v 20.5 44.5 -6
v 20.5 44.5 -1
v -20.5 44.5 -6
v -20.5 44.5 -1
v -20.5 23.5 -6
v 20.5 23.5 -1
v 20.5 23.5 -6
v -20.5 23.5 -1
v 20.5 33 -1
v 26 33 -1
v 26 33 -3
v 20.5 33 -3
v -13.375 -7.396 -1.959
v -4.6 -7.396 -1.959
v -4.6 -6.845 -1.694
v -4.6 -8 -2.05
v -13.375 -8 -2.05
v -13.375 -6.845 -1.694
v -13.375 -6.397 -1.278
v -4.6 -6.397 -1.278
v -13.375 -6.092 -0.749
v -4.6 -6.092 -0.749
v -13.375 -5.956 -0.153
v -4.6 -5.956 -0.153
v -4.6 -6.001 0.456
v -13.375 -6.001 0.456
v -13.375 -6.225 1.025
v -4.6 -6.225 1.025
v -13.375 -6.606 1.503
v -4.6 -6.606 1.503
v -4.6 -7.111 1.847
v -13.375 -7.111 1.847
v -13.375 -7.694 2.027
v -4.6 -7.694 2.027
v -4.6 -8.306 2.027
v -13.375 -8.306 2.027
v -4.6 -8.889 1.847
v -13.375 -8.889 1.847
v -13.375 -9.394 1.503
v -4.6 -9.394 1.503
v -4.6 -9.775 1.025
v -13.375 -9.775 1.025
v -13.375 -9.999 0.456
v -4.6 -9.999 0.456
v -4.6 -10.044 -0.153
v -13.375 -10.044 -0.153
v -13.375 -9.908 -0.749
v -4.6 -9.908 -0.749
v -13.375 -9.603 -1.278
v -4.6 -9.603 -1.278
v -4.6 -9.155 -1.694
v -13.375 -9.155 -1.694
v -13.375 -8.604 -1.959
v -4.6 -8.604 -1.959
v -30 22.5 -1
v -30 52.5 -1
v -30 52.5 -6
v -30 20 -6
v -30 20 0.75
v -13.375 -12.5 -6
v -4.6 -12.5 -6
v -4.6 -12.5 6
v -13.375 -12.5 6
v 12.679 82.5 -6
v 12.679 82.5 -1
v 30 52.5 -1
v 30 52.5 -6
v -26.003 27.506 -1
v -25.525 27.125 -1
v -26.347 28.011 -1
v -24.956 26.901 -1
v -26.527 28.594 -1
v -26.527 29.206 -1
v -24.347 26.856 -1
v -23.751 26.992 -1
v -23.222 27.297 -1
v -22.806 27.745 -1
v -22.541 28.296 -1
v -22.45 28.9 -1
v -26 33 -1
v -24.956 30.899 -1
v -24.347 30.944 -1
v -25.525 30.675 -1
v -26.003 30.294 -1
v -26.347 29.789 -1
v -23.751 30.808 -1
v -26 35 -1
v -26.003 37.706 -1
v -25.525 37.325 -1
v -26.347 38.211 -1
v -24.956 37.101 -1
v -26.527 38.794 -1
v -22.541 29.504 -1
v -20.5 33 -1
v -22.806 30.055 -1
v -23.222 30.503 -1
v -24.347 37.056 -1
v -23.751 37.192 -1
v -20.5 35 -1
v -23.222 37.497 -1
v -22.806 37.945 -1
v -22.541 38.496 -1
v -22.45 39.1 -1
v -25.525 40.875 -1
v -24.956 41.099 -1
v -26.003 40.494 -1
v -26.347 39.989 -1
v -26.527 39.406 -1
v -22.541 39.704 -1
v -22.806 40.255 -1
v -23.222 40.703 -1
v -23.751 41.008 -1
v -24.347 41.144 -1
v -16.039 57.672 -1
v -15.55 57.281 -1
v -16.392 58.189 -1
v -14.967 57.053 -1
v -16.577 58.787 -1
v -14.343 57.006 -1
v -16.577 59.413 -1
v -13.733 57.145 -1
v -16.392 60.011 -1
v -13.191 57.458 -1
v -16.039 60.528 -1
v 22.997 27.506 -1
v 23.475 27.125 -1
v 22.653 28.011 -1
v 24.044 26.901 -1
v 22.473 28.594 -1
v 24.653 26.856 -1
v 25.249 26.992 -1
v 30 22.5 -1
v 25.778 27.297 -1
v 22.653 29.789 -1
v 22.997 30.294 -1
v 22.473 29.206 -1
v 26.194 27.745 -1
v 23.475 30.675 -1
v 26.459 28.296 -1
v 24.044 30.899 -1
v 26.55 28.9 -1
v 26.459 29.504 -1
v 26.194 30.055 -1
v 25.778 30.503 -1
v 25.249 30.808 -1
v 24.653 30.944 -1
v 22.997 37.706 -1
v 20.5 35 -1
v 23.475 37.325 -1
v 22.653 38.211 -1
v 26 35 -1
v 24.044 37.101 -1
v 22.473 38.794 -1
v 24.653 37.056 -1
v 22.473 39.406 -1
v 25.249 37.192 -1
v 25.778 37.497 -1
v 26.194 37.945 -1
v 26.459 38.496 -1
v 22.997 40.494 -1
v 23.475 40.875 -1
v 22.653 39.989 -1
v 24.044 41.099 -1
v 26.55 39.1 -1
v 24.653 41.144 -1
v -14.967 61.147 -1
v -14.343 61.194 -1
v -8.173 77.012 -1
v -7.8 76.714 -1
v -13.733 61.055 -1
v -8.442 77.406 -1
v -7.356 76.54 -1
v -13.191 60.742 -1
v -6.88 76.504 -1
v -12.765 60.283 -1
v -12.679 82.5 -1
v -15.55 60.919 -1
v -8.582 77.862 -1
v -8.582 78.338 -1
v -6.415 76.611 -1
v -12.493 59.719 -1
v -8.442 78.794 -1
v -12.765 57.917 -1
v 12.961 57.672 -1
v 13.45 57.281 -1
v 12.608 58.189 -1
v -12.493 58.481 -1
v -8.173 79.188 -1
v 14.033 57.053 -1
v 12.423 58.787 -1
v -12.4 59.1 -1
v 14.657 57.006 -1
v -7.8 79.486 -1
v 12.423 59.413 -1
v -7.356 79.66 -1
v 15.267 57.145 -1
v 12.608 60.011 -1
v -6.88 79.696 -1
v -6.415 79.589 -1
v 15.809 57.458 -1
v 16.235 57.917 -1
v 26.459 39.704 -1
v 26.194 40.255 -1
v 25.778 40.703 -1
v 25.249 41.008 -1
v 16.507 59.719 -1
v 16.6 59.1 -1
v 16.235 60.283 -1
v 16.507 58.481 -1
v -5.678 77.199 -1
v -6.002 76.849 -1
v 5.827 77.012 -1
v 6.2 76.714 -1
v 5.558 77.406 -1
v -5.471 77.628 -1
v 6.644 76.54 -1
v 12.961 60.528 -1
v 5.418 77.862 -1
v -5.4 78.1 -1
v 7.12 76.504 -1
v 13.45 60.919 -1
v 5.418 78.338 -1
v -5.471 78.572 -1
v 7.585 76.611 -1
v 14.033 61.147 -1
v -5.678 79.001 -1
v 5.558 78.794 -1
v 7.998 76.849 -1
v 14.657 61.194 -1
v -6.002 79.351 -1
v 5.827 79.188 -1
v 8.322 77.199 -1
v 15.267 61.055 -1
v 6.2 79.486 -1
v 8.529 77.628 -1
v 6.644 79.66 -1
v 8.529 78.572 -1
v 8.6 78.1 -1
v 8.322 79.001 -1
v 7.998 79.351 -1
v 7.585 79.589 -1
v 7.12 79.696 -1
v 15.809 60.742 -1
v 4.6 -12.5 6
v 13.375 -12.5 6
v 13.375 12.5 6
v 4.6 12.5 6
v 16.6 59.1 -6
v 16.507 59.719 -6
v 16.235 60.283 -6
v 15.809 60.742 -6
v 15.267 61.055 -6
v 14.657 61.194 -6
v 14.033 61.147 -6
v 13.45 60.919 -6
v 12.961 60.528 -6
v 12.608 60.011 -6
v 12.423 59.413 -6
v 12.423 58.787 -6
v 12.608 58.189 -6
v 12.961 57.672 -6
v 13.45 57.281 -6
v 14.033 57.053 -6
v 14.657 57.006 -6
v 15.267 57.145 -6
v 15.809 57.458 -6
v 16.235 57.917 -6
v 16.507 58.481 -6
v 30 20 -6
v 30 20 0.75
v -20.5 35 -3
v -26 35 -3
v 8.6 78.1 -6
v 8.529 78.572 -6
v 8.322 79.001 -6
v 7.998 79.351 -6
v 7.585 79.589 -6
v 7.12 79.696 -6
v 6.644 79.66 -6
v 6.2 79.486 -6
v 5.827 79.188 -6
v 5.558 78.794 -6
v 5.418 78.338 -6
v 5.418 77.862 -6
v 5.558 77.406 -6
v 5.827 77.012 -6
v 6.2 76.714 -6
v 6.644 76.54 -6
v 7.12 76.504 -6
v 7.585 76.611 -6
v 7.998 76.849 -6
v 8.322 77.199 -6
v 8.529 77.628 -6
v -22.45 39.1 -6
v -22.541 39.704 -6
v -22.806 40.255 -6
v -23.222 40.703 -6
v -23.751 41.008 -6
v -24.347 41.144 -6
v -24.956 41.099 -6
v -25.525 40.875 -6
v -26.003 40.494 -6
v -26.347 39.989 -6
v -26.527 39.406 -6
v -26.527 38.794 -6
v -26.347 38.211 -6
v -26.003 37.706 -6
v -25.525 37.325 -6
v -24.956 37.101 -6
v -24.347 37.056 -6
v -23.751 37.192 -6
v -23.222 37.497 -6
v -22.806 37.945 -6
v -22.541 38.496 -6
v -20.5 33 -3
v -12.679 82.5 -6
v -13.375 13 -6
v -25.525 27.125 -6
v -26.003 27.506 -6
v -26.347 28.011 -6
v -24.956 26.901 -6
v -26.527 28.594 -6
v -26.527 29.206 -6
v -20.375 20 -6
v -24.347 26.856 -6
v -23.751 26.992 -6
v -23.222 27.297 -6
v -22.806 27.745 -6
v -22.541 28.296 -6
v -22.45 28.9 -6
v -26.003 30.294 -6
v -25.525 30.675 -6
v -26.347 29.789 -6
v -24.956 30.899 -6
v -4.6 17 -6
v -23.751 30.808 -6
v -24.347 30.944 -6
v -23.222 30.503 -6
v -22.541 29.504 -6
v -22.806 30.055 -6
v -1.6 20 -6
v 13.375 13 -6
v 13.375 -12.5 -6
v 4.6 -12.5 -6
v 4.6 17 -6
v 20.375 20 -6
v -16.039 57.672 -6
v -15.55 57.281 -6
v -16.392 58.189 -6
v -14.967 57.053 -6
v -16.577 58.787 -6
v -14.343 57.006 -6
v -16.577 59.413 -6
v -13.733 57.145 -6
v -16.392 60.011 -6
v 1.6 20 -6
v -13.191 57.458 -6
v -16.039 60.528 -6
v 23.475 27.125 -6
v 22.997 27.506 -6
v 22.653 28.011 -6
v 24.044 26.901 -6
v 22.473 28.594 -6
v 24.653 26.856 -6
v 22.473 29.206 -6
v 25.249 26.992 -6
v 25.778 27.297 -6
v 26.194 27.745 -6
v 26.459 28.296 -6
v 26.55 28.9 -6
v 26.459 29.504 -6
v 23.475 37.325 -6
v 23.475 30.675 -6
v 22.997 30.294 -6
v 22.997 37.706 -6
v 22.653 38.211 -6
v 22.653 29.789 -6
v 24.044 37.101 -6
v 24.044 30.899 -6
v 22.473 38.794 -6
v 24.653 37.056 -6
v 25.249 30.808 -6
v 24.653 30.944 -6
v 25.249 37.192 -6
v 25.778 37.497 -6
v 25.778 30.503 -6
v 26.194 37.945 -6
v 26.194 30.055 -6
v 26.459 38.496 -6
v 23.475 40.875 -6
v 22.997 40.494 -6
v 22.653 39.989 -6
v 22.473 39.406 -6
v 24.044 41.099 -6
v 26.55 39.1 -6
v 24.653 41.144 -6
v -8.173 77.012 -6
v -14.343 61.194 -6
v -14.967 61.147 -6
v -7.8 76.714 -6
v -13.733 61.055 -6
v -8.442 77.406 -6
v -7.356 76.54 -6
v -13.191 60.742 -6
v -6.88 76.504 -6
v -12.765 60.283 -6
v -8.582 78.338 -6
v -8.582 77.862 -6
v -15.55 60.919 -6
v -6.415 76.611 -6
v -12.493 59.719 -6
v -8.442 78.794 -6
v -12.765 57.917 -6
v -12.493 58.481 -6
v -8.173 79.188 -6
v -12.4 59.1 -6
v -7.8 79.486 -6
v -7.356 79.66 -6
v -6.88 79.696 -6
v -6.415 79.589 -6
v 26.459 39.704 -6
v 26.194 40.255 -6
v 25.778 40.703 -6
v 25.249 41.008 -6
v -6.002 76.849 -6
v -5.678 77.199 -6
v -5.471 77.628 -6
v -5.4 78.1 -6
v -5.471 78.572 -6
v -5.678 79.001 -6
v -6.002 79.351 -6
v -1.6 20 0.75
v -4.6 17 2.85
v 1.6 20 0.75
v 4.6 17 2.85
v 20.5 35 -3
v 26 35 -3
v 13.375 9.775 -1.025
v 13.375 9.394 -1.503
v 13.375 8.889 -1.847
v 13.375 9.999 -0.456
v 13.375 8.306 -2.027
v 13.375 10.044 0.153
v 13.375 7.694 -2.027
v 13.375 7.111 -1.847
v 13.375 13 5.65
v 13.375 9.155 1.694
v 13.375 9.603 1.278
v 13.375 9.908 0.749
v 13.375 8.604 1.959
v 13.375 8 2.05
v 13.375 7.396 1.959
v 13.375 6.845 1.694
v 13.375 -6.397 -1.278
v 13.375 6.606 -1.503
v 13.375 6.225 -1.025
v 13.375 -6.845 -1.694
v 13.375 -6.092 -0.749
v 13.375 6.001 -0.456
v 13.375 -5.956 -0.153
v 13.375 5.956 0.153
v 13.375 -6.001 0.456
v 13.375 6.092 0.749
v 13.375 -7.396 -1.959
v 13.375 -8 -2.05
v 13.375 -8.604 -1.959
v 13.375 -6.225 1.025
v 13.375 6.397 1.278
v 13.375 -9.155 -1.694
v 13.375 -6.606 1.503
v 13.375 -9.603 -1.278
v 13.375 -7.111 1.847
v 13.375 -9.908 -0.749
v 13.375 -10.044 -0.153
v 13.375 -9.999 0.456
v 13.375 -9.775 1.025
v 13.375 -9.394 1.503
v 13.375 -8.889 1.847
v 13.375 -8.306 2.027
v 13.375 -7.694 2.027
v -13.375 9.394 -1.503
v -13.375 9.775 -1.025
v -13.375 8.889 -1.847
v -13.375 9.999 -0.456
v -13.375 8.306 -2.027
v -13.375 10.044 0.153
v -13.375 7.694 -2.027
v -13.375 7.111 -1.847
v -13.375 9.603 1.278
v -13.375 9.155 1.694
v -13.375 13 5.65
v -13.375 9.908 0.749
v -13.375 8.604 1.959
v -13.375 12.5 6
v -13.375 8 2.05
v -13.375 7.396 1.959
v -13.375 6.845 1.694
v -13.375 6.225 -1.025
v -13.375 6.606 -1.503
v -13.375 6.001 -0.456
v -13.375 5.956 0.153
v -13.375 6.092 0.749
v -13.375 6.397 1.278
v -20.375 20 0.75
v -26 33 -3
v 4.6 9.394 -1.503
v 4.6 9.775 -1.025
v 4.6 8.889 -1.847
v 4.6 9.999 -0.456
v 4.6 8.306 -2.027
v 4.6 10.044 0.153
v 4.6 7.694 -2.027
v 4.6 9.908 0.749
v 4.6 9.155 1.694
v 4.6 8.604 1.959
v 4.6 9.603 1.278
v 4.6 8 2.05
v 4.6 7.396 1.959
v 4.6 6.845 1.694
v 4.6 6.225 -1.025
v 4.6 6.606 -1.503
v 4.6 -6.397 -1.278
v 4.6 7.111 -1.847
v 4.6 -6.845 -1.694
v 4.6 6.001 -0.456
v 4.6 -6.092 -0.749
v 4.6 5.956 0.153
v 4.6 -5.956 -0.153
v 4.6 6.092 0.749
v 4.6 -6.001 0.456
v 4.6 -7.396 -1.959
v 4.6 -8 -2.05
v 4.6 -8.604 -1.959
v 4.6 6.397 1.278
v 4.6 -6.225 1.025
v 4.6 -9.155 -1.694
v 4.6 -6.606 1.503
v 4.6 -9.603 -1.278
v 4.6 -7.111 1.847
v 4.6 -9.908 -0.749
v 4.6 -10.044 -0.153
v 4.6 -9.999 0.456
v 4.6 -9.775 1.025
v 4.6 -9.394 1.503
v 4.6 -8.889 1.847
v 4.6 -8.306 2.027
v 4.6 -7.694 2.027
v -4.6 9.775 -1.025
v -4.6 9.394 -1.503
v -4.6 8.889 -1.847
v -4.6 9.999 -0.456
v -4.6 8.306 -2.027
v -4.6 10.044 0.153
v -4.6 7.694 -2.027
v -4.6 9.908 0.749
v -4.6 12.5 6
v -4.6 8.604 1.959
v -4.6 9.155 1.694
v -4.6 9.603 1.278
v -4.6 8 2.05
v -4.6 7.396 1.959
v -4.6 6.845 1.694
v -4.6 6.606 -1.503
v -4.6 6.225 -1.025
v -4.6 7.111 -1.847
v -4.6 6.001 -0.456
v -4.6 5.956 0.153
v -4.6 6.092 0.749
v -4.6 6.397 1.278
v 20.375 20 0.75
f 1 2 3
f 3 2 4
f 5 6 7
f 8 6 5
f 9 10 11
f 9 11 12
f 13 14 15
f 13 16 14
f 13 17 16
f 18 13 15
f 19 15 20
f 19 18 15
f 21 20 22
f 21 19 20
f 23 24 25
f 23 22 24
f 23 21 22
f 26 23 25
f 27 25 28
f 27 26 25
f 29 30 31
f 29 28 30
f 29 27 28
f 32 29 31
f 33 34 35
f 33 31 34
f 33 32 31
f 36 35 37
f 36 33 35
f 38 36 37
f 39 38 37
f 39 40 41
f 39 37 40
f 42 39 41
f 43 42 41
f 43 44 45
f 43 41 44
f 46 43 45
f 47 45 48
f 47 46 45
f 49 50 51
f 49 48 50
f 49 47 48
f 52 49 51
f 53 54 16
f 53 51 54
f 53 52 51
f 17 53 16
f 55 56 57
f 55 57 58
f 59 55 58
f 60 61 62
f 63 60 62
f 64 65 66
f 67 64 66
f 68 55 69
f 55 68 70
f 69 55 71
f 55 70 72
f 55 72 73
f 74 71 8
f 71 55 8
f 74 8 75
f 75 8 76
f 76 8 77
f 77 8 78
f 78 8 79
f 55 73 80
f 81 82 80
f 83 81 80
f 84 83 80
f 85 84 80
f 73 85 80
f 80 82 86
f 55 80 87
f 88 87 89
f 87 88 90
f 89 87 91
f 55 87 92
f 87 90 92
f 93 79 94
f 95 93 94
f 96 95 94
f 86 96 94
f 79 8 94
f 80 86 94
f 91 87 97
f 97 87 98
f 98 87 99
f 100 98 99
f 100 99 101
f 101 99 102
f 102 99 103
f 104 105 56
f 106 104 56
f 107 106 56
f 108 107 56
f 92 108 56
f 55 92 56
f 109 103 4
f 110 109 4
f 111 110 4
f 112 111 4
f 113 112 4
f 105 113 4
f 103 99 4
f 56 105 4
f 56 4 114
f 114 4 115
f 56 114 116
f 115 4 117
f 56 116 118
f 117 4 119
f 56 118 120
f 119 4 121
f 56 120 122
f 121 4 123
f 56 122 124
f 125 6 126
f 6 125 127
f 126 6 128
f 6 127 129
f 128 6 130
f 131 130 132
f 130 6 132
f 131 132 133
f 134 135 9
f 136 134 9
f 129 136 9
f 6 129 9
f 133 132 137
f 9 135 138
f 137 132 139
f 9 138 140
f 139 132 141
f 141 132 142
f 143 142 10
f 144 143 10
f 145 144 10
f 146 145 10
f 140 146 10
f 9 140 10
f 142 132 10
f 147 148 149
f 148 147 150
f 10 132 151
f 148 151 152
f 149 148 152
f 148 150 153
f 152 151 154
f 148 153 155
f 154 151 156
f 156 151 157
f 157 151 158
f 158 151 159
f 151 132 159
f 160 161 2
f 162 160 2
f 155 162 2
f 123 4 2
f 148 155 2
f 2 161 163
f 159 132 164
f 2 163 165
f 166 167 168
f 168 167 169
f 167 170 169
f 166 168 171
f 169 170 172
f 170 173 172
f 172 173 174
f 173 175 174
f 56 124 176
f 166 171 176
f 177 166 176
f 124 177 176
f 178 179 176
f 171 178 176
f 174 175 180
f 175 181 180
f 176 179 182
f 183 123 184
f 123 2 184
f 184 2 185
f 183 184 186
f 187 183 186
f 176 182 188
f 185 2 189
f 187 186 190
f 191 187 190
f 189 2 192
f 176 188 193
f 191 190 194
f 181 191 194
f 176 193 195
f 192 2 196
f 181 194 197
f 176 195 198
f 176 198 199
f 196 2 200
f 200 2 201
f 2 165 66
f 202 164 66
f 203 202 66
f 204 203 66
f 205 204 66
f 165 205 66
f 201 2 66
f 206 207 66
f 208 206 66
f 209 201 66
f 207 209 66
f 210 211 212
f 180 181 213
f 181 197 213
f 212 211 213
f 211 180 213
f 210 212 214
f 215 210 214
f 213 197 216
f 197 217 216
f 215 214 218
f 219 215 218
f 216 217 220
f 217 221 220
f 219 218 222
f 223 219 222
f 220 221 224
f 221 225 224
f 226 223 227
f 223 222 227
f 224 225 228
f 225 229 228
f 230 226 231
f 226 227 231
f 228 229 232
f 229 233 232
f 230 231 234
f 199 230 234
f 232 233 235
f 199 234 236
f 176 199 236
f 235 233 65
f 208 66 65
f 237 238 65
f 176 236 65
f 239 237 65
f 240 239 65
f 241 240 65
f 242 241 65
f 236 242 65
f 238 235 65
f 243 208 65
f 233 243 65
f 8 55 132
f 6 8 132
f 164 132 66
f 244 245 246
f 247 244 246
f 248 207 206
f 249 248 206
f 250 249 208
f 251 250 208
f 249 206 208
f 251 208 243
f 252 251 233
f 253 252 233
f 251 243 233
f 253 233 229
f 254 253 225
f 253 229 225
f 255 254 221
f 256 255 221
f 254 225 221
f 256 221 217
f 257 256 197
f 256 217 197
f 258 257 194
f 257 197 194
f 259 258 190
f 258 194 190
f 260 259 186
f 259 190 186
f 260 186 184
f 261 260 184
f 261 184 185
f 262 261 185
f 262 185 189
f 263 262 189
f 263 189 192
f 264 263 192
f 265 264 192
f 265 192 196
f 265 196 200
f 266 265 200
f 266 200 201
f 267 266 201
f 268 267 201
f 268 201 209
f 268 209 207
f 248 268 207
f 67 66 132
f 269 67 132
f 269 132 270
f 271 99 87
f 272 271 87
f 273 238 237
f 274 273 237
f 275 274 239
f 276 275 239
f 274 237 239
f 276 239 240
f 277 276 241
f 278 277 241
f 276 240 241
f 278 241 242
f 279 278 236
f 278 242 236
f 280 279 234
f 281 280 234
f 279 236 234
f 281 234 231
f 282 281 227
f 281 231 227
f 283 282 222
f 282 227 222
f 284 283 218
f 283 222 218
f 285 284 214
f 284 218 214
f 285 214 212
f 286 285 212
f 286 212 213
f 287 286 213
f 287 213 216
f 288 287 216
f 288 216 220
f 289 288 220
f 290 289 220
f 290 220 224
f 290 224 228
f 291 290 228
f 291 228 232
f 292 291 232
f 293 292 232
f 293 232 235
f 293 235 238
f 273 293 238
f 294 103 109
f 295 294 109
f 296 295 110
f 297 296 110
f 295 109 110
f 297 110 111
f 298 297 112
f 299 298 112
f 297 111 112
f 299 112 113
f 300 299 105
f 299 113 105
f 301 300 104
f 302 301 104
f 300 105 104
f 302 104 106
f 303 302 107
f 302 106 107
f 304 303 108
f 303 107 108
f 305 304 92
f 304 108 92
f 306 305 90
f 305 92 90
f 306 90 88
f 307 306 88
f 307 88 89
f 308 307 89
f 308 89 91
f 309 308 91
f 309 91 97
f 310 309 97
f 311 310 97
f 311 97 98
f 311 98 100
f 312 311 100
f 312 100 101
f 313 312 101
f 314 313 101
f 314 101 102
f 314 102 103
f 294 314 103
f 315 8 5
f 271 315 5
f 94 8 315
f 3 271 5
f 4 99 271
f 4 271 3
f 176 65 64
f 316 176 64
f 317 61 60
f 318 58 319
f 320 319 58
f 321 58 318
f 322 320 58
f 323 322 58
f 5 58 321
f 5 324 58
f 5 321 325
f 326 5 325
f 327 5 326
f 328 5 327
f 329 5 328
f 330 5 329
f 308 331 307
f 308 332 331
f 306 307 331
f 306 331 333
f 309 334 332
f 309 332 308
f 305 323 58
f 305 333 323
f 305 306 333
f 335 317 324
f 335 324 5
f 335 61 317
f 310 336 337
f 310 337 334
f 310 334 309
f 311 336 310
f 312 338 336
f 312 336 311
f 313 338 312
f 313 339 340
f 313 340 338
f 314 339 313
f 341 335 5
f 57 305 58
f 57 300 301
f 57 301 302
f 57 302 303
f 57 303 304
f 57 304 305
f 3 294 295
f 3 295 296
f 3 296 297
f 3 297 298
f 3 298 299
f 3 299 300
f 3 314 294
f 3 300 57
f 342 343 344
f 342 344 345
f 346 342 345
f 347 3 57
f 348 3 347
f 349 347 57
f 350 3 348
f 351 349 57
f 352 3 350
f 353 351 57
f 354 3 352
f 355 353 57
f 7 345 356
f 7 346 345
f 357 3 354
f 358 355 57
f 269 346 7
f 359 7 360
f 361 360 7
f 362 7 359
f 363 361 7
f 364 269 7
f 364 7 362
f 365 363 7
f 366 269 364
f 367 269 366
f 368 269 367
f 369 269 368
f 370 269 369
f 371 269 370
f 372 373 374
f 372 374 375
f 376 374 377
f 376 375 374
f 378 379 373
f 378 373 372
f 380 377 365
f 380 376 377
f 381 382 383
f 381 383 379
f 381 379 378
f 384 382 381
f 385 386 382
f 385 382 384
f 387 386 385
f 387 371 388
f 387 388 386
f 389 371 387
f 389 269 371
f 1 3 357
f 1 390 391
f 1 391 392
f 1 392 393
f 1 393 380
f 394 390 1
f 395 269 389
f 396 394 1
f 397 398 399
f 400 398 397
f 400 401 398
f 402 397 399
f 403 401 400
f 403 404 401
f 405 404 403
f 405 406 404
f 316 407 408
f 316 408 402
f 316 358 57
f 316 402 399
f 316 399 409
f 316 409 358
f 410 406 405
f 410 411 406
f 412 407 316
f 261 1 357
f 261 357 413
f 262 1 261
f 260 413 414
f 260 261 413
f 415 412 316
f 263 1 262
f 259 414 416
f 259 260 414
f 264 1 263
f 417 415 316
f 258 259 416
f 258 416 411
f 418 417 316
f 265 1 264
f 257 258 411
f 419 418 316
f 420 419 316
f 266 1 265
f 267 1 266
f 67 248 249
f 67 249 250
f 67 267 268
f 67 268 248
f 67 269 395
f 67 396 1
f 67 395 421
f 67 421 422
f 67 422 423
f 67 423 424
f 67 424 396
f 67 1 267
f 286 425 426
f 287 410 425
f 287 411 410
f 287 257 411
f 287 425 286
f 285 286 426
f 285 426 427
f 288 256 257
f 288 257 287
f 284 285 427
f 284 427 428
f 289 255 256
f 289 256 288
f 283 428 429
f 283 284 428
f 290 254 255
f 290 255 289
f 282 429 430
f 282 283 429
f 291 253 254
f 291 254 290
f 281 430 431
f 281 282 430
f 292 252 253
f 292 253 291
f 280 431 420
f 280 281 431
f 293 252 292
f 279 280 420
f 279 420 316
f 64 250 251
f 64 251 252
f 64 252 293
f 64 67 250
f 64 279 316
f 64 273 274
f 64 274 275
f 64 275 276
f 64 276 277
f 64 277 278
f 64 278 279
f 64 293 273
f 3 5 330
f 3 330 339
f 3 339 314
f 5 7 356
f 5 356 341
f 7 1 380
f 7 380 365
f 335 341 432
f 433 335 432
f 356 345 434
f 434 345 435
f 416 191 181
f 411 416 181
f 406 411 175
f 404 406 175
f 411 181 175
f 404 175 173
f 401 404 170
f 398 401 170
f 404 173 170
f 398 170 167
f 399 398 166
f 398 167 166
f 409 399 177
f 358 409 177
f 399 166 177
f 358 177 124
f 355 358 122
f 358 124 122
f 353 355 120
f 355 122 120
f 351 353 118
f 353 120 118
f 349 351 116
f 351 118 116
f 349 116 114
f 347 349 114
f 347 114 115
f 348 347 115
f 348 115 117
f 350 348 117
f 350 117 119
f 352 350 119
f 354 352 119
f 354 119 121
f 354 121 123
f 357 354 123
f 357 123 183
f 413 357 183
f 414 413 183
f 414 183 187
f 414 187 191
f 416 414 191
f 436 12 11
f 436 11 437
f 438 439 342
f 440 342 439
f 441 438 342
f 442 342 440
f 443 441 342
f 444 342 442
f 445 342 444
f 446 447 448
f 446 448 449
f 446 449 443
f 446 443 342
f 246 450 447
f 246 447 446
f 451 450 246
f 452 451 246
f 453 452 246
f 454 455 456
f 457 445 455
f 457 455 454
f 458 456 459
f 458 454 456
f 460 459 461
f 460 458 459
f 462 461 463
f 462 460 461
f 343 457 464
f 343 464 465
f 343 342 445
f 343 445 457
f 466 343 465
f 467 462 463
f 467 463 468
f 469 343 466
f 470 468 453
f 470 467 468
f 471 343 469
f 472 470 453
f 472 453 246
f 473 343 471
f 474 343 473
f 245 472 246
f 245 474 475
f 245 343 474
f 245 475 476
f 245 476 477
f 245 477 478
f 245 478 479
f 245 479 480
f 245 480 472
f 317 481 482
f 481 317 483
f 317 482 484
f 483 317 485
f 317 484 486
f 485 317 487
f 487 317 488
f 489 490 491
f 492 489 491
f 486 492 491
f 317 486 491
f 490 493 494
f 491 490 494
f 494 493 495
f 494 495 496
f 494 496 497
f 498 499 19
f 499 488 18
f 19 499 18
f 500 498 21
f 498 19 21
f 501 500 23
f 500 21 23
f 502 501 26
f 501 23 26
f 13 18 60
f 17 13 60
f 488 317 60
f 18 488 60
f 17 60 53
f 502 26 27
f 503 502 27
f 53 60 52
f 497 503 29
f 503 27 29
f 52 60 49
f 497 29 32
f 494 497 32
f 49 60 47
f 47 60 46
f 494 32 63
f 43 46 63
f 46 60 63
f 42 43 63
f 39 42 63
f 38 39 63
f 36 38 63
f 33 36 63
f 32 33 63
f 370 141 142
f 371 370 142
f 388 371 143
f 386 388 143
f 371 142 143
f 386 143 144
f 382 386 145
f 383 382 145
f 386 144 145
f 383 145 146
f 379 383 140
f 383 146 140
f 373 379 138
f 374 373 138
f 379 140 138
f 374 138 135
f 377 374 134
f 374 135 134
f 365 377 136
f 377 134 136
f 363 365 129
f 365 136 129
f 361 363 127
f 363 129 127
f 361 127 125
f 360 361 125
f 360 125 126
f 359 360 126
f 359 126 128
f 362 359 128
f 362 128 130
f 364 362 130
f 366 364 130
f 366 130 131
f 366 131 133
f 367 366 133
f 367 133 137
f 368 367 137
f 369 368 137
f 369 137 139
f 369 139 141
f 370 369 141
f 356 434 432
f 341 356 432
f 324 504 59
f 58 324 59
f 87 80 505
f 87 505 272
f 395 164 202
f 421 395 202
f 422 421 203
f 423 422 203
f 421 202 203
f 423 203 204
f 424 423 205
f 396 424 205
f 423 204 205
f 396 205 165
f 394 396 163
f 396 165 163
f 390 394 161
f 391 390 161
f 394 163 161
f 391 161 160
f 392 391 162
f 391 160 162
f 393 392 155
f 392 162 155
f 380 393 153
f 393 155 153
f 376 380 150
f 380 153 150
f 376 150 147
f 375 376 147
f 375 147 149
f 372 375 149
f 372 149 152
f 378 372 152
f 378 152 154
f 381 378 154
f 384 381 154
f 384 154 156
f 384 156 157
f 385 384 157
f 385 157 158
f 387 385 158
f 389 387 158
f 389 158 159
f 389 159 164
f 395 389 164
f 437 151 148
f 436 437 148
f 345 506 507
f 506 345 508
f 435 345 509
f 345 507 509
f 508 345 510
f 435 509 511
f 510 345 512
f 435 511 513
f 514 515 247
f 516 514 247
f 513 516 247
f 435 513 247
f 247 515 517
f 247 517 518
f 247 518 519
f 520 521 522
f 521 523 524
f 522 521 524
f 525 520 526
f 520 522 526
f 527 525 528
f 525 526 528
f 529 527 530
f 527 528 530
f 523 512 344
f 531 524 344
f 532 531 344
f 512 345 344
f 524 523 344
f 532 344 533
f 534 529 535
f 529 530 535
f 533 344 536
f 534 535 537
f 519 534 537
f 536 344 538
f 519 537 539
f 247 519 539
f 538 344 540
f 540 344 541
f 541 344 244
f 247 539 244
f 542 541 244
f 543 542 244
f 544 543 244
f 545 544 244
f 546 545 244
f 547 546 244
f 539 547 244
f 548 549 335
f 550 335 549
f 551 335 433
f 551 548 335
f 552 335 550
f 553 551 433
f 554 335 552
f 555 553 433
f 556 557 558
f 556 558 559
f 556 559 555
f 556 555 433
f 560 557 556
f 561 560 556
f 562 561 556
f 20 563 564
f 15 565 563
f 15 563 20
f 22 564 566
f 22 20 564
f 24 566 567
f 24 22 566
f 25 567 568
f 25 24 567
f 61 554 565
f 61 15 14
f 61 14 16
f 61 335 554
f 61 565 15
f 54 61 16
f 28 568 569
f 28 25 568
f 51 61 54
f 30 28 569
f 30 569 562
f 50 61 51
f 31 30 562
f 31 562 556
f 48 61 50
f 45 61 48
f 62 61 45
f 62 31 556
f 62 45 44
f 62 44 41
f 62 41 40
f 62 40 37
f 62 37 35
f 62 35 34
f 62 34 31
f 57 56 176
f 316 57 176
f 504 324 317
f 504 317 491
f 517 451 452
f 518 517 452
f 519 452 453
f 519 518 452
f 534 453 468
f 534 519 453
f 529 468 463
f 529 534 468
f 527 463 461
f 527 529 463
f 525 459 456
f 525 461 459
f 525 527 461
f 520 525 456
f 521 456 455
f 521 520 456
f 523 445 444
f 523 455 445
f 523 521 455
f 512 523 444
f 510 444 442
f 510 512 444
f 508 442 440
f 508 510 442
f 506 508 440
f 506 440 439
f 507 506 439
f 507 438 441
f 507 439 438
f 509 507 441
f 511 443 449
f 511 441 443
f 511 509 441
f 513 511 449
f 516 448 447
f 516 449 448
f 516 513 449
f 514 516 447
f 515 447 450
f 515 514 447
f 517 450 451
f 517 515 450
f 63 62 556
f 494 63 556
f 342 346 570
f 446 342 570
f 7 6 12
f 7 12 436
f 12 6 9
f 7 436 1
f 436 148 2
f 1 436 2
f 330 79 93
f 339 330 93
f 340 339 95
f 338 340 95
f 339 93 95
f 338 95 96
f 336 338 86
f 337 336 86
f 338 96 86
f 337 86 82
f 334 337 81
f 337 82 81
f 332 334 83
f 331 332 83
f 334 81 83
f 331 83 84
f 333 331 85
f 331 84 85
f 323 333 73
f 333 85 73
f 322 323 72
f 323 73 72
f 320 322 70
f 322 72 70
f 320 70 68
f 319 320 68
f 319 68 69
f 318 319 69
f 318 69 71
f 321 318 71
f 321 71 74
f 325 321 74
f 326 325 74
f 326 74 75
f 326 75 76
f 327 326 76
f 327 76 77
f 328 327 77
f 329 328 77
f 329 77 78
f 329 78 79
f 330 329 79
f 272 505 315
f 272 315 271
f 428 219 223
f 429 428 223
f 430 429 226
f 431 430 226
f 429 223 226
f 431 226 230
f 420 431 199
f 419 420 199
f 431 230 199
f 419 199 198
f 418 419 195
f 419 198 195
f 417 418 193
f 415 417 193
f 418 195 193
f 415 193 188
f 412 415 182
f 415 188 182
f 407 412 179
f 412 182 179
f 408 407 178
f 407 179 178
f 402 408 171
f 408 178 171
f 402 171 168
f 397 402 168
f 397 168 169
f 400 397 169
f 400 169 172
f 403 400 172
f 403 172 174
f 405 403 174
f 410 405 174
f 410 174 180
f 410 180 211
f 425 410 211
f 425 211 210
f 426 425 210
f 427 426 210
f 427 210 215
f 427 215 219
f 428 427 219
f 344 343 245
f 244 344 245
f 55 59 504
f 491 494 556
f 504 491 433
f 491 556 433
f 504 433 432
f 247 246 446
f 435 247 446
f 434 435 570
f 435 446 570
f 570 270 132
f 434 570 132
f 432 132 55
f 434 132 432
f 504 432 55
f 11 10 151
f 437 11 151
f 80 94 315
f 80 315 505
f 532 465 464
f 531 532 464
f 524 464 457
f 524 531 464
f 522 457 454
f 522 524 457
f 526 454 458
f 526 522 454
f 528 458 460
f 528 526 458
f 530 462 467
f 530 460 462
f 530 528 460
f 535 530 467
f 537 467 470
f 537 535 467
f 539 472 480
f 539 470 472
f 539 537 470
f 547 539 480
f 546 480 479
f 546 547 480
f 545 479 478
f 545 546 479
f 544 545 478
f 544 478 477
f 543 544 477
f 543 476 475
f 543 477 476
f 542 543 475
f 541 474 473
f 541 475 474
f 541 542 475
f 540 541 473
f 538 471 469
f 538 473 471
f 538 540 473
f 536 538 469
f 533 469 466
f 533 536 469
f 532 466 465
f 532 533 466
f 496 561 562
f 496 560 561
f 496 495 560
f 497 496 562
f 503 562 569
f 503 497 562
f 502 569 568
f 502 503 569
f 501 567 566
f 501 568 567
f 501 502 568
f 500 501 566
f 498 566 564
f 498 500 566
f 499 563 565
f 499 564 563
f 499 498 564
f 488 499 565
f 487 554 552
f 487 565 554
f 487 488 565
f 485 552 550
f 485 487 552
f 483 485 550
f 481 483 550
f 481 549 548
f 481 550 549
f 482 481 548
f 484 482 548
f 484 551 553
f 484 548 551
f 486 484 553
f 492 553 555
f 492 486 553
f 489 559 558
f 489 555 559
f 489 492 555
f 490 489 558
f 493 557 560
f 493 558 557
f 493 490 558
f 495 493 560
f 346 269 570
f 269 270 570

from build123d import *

# Parameters (mm, degrees)
SKETCH2_R           = 2.05
BOSS_EXTRUDE1_DEPTH = 30
CUT_EXTRUDE1_START  = -12.5
SKETCH3_W           = 9.2
SKETCH3_H           = 15
SKETCH3_W_2         = 33.25
CUT_EXTRUDE1_DEPTH  = 32.5
CHAMFER1_SIZE       = 3
CHAMFER2_SIZE       = 7
SKETCH4_R           = 2.05
SKETCH4_W           = 21
SKETCH4_H           = 41
CUT_EXTRUDE2_DEPTH  = 30
SKETCH5_R           = 2.1
SKETCH5_R_2         = 1.6
CUT_EXTRUDE3_DEPTH  = 10
CUT_EXTRUDE4_DEPTH  = 10
CUT_EXTRUDE6_START  = -1
SKETCH8_W           = 2
SKETCH8_H           = 52
CUT_EXTRUDE6_DEPTH  = 2


with BuildPart() as part:
    # Sketch2 → Boss-Extrude1 (new, symmetric)
    with BuildSketch(Plane.YZ):
        Polygon((-12.5, 6), (12.5, 6), (22.5, -1), (82.5, -1), (82.5, -6), (12.5, -6), (-12.5, -6), align=None)
        with Locations(Location((-8, 0, 0), (0, 0, 270))):
            Circle(SKETCH2_R, mode=Mode.SUBTRACT)
        with Locations(Location((8, 0, 0), (0, 0, 90))):
            Circle(SKETCH2_R, mode=Mode.SUBTRACT)
    extrude(amount=BOSS_EXTRUDE1_DEPTH, both=True)

    # Sketch3 → Cut-Extrude1 (cut)
    with BuildSketch(Plane(origin=(0, 0, 0), x_dir=(-1, 0, 0), z_dir=(0, 1, 0)).offset(CUT_EXTRUDE1_START)):
        Rectangle(SKETCH3_W, SKETCH3_H)
        with Locations((-30, 0)):
            Rectangle(SKETCH3_W_2, SKETCH3_H)
        with Locations((30, 0)):
            Rectangle(SKETCH3_W_2, SKETCH3_H)
    extrude(amount=CUT_EXTRUDE1_DEPTH, mode=Mode.SUBTRACT)

    # Chamfer1
    chamfer1_edges = [part.edges().sort_by_distance(p)[0] for p in [
        (-4.6, 20, -2.625),
        (4.6, 20, -2.625),
    ]]
    chamfer(chamfer1_edges, length=CHAMFER1_SIZE)

    # Chamfer2
    chamfer2_edges = [part.edges().sort_by_distance(p)[0] for p in [
        (-13.375, 20, -2.625),
        (13.375, 20, -2.625),
    ]]
    chamfer(chamfer2_edges, length=CHAMFER2_SIZE)

    # Sketch4 → Cut-Extrude2 (cut)
    with BuildSketch(Plane(origin=(0, 0, 0), x_dir=(0, 1, 0), z_dir=(0, 0, 1))):
        with Locations(Location((39.1, 24.5, 0), (0, 0, 270))):
            Circle(SKETCH4_R)
        with Locations(Location((28.9, 24.5, 0), (0, 0, 270))):
            Circle(SKETCH4_R)
        with Locations(Location((28.9, -24.5, 0), (0, 0, 270))):
            Circle(SKETCH4_R)
        with Locations(Location((39.1, -24.5, 0), (0, 0, 270))):
            Circle(SKETCH4_R)
        with Locations((34, 0)):
            Rectangle(SKETCH4_W, SKETCH4_H)
    extrude(amount=-CUT_EXTRUDE2_DEPTH, mode=Mode.SUBTRACT)

    # Sketch5 → Cut-Extrude3 (cut)
    with BuildSketch(Plane(origin=(0, 0, 0), x_dir=(0, 1, 0), z_dir=(0, 0, 1))):
        with Locations(Location((59.1, 14.5, 0), (0, 0, 270))):
            Circle(SKETCH5_R)
        with Locations(Location((59.1, -14.5, 0), (0, 0, 270))):
            Circle(SKETCH5_R)
        with Locations(Location((78.1, 7, 0), (0, 0, 270))):
            Circle(SKETCH5_R_2)
        with Locations(Location((78.1, -7, 0), (0, 0, 270))):
            Circle(SKETCH5_R_2)
    extrude(amount=-CUT_EXTRUDE3_DEPTH, mode=Mode.SUBTRACT)

    # Sketch6 → Cut-Extrude4 (cut)
    with BuildSketch(Plane(origin=(0, 0, 0), x_dir=(0, 1, 0), z_dir=(0, 0, 1))):
        Polygon((52.5, 30), (82.5, 12.679491924), (82.5, -12.679491924), (52.5, -30), (52.5, -35), (87.5, -35), (87.5, 35), (52.5, 35), align=None)
    extrude(amount=-CUT_EXTRUDE4_DEPTH, mode=Mode.SUBTRACT)

    # Sketch8 → Cut-Extrude6 (cut)
    with BuildSketch(Plane(origin=(0, 0, 0), x_dir=(0, 1, 0), z_dir=(0, 0, 1)).offset(CUT_EXTRUDE6_START)):
        with Locations((34, 0)):
            Rectangle(SKETCH8_W, SKETCH8_H)
    extrude(amount=-CUT_EXTRUDE6_DEPTH, mode=Mode.SUBTRACT)


solid = part.part
